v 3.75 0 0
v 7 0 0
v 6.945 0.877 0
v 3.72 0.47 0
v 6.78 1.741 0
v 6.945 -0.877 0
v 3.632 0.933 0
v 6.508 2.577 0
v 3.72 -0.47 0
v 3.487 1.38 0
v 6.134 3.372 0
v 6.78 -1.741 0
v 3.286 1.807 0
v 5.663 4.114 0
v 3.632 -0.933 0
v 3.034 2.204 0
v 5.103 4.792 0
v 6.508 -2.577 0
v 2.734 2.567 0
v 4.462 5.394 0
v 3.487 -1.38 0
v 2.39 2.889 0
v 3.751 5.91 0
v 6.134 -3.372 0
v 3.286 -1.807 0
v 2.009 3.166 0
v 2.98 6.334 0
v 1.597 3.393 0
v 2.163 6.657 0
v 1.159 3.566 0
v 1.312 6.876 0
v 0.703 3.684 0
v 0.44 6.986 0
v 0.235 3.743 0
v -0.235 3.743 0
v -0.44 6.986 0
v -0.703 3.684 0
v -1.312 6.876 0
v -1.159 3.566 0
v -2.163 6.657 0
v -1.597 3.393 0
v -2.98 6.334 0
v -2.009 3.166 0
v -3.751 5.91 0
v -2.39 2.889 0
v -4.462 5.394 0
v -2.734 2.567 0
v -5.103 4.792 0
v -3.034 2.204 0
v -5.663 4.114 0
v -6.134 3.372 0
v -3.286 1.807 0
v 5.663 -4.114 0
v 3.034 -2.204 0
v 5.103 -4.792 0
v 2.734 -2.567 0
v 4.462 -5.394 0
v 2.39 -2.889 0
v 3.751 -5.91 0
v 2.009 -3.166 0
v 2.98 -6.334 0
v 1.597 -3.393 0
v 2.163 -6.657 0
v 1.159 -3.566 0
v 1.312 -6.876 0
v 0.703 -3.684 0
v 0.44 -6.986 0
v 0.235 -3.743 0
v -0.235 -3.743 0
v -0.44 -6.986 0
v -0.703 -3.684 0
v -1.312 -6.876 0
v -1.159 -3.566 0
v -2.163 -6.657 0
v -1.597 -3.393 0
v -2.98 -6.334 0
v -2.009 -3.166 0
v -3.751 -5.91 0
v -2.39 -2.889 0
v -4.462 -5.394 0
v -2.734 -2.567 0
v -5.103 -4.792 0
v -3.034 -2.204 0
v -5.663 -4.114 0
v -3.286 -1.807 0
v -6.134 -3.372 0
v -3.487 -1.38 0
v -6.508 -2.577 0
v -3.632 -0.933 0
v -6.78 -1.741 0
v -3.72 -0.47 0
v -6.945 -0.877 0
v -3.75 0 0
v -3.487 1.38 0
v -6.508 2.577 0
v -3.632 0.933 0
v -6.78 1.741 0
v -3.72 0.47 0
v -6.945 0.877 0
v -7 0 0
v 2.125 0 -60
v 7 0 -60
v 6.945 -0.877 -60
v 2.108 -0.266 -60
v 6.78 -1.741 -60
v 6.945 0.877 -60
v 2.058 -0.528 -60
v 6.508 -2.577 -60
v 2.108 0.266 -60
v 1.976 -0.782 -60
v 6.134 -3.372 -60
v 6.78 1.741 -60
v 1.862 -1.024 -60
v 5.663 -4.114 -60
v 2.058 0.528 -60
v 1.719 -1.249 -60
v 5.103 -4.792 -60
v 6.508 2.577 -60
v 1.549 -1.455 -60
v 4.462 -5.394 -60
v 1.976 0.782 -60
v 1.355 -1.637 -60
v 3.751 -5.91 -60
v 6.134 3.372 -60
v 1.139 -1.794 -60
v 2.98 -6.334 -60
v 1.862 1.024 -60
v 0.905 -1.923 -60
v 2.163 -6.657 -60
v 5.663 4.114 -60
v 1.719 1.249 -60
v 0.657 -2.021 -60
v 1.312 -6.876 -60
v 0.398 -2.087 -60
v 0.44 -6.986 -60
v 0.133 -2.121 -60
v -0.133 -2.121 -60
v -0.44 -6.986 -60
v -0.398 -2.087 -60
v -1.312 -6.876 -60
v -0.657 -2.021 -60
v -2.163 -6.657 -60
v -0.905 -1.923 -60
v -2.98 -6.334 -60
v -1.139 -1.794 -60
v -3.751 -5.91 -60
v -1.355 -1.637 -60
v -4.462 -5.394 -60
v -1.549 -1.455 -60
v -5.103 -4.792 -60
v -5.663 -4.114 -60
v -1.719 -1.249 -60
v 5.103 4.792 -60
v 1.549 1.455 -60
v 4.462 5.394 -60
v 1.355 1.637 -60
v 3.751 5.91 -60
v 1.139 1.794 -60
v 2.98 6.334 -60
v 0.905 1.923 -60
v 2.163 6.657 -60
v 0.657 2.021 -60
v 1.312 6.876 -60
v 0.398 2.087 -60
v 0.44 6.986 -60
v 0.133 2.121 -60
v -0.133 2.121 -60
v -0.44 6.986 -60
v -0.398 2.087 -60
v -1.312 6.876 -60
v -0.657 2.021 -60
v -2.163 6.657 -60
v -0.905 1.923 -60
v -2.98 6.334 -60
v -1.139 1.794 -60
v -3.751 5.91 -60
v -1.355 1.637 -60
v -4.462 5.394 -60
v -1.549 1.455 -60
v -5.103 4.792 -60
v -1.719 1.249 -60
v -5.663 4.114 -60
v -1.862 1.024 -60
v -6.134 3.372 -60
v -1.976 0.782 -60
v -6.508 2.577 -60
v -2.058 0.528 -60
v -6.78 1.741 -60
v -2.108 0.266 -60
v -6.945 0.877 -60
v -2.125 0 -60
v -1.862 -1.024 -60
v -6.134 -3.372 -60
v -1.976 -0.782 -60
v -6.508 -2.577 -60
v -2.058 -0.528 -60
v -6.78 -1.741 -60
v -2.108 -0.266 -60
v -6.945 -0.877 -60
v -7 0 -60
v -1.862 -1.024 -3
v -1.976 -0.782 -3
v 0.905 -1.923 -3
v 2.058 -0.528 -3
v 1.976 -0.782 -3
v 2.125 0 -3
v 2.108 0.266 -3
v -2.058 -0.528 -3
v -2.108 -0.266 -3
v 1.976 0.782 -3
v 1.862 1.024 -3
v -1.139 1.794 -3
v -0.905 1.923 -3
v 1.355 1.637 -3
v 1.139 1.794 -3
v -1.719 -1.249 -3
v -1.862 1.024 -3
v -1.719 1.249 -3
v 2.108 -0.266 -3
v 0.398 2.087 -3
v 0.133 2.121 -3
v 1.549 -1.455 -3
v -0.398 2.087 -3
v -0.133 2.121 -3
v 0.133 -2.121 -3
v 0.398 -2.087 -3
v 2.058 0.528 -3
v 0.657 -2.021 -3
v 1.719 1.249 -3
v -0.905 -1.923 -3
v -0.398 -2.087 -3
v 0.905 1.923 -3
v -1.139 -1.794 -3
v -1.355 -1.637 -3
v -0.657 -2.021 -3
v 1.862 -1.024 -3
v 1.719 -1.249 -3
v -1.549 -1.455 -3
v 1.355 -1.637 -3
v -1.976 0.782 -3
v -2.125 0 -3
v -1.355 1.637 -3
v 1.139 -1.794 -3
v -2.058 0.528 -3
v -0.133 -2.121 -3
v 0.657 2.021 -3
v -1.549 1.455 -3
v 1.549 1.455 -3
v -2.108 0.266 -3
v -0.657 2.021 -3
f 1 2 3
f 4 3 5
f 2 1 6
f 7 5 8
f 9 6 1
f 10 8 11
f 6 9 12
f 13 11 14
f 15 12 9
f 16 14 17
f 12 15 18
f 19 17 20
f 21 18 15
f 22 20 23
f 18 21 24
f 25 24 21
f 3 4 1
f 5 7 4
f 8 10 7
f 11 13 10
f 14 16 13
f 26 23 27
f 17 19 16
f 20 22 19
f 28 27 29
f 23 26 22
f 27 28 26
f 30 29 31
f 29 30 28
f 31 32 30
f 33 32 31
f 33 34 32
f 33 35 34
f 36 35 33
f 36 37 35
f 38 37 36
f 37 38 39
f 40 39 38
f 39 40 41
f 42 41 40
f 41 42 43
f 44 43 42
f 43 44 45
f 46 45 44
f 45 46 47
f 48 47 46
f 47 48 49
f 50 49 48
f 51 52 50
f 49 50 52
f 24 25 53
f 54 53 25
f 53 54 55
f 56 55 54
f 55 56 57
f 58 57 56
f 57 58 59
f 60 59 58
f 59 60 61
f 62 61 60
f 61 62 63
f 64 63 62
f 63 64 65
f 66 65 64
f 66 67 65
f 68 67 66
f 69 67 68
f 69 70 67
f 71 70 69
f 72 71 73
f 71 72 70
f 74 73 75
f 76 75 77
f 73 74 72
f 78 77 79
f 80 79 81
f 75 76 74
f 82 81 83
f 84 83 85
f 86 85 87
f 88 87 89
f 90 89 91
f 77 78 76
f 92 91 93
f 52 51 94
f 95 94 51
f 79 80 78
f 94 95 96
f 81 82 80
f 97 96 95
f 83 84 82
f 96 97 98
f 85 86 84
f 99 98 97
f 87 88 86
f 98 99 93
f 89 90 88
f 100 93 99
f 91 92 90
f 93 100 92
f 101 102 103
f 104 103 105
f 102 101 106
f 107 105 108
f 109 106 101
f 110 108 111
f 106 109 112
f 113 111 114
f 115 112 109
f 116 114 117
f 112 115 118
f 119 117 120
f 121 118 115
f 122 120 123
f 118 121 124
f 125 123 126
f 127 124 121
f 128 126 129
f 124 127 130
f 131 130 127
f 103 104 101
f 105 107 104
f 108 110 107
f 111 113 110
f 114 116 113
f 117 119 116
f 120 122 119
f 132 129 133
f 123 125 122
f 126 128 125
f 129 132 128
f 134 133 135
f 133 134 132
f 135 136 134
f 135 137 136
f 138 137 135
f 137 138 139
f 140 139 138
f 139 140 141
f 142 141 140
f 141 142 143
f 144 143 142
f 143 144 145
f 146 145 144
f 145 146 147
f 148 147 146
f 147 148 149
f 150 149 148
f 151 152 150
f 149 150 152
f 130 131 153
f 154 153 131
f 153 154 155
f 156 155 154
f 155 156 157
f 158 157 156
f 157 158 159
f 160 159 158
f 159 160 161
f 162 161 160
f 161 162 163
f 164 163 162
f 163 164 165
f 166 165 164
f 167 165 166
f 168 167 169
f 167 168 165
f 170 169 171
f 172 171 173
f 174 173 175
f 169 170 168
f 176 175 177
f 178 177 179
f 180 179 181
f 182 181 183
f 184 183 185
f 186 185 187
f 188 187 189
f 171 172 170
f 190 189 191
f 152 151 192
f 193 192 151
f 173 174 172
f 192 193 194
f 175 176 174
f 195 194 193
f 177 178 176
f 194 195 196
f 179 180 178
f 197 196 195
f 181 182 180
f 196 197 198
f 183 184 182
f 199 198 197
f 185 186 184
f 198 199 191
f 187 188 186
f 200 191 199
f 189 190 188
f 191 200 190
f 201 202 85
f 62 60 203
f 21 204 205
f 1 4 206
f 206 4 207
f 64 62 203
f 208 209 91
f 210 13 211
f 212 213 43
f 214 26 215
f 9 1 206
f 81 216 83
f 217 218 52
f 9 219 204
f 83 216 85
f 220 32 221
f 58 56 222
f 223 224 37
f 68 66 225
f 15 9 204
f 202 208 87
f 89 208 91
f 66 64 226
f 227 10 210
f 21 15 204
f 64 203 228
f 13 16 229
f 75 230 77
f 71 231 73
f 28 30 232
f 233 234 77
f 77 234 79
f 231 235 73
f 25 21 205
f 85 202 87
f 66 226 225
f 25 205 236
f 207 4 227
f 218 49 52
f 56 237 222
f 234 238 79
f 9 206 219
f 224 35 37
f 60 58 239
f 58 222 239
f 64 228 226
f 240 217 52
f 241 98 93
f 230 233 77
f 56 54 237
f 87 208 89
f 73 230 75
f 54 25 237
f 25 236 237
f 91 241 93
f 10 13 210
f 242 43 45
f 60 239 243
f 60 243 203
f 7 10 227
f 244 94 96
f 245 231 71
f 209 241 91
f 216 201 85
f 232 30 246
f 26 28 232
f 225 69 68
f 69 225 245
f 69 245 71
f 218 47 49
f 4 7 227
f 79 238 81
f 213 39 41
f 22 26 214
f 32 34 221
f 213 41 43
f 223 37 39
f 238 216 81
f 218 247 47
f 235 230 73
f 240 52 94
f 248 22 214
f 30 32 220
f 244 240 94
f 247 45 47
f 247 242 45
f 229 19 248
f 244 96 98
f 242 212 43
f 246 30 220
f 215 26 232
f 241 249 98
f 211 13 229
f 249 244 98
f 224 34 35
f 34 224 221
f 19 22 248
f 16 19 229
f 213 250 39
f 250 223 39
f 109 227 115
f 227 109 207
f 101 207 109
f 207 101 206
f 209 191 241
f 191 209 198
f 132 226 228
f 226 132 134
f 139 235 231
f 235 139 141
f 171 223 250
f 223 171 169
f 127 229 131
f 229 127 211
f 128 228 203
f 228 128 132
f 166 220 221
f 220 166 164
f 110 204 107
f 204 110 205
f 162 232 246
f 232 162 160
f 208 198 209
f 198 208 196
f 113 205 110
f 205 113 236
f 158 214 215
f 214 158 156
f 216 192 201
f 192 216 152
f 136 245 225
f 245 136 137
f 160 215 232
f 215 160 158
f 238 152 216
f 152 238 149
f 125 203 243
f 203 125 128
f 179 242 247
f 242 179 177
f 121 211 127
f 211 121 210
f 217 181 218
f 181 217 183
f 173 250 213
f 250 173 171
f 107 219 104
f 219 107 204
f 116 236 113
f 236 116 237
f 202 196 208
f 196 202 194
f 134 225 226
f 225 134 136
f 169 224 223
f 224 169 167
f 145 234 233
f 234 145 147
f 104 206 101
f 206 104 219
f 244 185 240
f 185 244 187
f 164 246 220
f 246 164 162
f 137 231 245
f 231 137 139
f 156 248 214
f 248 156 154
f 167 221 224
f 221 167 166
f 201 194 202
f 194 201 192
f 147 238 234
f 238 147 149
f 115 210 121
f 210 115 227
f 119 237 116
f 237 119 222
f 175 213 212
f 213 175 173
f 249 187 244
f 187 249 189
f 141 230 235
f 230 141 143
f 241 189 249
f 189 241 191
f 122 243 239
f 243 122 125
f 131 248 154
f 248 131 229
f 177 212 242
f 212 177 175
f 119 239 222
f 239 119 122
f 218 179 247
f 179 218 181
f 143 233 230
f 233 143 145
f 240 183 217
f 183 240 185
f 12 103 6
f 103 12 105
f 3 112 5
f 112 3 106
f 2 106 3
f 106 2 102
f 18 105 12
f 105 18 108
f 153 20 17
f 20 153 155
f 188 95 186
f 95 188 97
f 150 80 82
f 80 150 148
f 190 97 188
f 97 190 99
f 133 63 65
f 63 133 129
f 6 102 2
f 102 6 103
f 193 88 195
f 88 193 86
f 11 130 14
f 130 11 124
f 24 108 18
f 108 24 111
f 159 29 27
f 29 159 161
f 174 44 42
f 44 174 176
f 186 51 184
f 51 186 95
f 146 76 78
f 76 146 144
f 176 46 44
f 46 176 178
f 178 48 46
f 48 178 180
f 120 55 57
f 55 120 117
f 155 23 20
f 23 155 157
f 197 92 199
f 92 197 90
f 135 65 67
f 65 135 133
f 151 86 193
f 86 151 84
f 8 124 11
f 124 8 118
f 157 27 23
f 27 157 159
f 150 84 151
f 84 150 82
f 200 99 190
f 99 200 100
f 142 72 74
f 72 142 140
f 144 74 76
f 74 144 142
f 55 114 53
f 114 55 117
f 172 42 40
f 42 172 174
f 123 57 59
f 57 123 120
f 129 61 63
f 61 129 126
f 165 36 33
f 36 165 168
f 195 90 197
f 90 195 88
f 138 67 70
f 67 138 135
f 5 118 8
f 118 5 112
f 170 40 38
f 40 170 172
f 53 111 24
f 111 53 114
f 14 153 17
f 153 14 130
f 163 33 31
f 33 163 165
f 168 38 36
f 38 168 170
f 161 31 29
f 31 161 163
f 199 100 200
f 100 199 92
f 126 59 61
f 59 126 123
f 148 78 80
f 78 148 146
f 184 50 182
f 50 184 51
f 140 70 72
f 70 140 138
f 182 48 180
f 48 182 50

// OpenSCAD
$fn = 50;


difference() {
	union() {
		translate(v = [0, 0, -60.0000000000]) {
			cylinder(h = 60, r = 7.0000000000);
		}
		cylinder(h = 0, r = 17.0000000000);
	}
	union() {
		translate(v = [0, 0, 0]) {
			rotate(a = [0, 0, 0]) {
				difference() {
					union() {
						#translate(v = [0, 0, -60.0000000000]) {
							cylinder(h = 60, r = 2.0000000000);
						}
						#translate(v = [0, 0, -3]) {
							cylinder(h = 3, r = 7.0000000000, r1 = 2.1250000000, r2 = 3.7500000000);
						}
						#translate(v = [0, 0, -60.0000000000]) {
							cylinder(h = 60, r = 2.1250000000);
						}
						#translate(v = [0, 0, -60.0000000000]) {
							cylinder(h = 60, r = 2.0000000000);
						}
					}
					union();
				}
			}
		}
	}
}
